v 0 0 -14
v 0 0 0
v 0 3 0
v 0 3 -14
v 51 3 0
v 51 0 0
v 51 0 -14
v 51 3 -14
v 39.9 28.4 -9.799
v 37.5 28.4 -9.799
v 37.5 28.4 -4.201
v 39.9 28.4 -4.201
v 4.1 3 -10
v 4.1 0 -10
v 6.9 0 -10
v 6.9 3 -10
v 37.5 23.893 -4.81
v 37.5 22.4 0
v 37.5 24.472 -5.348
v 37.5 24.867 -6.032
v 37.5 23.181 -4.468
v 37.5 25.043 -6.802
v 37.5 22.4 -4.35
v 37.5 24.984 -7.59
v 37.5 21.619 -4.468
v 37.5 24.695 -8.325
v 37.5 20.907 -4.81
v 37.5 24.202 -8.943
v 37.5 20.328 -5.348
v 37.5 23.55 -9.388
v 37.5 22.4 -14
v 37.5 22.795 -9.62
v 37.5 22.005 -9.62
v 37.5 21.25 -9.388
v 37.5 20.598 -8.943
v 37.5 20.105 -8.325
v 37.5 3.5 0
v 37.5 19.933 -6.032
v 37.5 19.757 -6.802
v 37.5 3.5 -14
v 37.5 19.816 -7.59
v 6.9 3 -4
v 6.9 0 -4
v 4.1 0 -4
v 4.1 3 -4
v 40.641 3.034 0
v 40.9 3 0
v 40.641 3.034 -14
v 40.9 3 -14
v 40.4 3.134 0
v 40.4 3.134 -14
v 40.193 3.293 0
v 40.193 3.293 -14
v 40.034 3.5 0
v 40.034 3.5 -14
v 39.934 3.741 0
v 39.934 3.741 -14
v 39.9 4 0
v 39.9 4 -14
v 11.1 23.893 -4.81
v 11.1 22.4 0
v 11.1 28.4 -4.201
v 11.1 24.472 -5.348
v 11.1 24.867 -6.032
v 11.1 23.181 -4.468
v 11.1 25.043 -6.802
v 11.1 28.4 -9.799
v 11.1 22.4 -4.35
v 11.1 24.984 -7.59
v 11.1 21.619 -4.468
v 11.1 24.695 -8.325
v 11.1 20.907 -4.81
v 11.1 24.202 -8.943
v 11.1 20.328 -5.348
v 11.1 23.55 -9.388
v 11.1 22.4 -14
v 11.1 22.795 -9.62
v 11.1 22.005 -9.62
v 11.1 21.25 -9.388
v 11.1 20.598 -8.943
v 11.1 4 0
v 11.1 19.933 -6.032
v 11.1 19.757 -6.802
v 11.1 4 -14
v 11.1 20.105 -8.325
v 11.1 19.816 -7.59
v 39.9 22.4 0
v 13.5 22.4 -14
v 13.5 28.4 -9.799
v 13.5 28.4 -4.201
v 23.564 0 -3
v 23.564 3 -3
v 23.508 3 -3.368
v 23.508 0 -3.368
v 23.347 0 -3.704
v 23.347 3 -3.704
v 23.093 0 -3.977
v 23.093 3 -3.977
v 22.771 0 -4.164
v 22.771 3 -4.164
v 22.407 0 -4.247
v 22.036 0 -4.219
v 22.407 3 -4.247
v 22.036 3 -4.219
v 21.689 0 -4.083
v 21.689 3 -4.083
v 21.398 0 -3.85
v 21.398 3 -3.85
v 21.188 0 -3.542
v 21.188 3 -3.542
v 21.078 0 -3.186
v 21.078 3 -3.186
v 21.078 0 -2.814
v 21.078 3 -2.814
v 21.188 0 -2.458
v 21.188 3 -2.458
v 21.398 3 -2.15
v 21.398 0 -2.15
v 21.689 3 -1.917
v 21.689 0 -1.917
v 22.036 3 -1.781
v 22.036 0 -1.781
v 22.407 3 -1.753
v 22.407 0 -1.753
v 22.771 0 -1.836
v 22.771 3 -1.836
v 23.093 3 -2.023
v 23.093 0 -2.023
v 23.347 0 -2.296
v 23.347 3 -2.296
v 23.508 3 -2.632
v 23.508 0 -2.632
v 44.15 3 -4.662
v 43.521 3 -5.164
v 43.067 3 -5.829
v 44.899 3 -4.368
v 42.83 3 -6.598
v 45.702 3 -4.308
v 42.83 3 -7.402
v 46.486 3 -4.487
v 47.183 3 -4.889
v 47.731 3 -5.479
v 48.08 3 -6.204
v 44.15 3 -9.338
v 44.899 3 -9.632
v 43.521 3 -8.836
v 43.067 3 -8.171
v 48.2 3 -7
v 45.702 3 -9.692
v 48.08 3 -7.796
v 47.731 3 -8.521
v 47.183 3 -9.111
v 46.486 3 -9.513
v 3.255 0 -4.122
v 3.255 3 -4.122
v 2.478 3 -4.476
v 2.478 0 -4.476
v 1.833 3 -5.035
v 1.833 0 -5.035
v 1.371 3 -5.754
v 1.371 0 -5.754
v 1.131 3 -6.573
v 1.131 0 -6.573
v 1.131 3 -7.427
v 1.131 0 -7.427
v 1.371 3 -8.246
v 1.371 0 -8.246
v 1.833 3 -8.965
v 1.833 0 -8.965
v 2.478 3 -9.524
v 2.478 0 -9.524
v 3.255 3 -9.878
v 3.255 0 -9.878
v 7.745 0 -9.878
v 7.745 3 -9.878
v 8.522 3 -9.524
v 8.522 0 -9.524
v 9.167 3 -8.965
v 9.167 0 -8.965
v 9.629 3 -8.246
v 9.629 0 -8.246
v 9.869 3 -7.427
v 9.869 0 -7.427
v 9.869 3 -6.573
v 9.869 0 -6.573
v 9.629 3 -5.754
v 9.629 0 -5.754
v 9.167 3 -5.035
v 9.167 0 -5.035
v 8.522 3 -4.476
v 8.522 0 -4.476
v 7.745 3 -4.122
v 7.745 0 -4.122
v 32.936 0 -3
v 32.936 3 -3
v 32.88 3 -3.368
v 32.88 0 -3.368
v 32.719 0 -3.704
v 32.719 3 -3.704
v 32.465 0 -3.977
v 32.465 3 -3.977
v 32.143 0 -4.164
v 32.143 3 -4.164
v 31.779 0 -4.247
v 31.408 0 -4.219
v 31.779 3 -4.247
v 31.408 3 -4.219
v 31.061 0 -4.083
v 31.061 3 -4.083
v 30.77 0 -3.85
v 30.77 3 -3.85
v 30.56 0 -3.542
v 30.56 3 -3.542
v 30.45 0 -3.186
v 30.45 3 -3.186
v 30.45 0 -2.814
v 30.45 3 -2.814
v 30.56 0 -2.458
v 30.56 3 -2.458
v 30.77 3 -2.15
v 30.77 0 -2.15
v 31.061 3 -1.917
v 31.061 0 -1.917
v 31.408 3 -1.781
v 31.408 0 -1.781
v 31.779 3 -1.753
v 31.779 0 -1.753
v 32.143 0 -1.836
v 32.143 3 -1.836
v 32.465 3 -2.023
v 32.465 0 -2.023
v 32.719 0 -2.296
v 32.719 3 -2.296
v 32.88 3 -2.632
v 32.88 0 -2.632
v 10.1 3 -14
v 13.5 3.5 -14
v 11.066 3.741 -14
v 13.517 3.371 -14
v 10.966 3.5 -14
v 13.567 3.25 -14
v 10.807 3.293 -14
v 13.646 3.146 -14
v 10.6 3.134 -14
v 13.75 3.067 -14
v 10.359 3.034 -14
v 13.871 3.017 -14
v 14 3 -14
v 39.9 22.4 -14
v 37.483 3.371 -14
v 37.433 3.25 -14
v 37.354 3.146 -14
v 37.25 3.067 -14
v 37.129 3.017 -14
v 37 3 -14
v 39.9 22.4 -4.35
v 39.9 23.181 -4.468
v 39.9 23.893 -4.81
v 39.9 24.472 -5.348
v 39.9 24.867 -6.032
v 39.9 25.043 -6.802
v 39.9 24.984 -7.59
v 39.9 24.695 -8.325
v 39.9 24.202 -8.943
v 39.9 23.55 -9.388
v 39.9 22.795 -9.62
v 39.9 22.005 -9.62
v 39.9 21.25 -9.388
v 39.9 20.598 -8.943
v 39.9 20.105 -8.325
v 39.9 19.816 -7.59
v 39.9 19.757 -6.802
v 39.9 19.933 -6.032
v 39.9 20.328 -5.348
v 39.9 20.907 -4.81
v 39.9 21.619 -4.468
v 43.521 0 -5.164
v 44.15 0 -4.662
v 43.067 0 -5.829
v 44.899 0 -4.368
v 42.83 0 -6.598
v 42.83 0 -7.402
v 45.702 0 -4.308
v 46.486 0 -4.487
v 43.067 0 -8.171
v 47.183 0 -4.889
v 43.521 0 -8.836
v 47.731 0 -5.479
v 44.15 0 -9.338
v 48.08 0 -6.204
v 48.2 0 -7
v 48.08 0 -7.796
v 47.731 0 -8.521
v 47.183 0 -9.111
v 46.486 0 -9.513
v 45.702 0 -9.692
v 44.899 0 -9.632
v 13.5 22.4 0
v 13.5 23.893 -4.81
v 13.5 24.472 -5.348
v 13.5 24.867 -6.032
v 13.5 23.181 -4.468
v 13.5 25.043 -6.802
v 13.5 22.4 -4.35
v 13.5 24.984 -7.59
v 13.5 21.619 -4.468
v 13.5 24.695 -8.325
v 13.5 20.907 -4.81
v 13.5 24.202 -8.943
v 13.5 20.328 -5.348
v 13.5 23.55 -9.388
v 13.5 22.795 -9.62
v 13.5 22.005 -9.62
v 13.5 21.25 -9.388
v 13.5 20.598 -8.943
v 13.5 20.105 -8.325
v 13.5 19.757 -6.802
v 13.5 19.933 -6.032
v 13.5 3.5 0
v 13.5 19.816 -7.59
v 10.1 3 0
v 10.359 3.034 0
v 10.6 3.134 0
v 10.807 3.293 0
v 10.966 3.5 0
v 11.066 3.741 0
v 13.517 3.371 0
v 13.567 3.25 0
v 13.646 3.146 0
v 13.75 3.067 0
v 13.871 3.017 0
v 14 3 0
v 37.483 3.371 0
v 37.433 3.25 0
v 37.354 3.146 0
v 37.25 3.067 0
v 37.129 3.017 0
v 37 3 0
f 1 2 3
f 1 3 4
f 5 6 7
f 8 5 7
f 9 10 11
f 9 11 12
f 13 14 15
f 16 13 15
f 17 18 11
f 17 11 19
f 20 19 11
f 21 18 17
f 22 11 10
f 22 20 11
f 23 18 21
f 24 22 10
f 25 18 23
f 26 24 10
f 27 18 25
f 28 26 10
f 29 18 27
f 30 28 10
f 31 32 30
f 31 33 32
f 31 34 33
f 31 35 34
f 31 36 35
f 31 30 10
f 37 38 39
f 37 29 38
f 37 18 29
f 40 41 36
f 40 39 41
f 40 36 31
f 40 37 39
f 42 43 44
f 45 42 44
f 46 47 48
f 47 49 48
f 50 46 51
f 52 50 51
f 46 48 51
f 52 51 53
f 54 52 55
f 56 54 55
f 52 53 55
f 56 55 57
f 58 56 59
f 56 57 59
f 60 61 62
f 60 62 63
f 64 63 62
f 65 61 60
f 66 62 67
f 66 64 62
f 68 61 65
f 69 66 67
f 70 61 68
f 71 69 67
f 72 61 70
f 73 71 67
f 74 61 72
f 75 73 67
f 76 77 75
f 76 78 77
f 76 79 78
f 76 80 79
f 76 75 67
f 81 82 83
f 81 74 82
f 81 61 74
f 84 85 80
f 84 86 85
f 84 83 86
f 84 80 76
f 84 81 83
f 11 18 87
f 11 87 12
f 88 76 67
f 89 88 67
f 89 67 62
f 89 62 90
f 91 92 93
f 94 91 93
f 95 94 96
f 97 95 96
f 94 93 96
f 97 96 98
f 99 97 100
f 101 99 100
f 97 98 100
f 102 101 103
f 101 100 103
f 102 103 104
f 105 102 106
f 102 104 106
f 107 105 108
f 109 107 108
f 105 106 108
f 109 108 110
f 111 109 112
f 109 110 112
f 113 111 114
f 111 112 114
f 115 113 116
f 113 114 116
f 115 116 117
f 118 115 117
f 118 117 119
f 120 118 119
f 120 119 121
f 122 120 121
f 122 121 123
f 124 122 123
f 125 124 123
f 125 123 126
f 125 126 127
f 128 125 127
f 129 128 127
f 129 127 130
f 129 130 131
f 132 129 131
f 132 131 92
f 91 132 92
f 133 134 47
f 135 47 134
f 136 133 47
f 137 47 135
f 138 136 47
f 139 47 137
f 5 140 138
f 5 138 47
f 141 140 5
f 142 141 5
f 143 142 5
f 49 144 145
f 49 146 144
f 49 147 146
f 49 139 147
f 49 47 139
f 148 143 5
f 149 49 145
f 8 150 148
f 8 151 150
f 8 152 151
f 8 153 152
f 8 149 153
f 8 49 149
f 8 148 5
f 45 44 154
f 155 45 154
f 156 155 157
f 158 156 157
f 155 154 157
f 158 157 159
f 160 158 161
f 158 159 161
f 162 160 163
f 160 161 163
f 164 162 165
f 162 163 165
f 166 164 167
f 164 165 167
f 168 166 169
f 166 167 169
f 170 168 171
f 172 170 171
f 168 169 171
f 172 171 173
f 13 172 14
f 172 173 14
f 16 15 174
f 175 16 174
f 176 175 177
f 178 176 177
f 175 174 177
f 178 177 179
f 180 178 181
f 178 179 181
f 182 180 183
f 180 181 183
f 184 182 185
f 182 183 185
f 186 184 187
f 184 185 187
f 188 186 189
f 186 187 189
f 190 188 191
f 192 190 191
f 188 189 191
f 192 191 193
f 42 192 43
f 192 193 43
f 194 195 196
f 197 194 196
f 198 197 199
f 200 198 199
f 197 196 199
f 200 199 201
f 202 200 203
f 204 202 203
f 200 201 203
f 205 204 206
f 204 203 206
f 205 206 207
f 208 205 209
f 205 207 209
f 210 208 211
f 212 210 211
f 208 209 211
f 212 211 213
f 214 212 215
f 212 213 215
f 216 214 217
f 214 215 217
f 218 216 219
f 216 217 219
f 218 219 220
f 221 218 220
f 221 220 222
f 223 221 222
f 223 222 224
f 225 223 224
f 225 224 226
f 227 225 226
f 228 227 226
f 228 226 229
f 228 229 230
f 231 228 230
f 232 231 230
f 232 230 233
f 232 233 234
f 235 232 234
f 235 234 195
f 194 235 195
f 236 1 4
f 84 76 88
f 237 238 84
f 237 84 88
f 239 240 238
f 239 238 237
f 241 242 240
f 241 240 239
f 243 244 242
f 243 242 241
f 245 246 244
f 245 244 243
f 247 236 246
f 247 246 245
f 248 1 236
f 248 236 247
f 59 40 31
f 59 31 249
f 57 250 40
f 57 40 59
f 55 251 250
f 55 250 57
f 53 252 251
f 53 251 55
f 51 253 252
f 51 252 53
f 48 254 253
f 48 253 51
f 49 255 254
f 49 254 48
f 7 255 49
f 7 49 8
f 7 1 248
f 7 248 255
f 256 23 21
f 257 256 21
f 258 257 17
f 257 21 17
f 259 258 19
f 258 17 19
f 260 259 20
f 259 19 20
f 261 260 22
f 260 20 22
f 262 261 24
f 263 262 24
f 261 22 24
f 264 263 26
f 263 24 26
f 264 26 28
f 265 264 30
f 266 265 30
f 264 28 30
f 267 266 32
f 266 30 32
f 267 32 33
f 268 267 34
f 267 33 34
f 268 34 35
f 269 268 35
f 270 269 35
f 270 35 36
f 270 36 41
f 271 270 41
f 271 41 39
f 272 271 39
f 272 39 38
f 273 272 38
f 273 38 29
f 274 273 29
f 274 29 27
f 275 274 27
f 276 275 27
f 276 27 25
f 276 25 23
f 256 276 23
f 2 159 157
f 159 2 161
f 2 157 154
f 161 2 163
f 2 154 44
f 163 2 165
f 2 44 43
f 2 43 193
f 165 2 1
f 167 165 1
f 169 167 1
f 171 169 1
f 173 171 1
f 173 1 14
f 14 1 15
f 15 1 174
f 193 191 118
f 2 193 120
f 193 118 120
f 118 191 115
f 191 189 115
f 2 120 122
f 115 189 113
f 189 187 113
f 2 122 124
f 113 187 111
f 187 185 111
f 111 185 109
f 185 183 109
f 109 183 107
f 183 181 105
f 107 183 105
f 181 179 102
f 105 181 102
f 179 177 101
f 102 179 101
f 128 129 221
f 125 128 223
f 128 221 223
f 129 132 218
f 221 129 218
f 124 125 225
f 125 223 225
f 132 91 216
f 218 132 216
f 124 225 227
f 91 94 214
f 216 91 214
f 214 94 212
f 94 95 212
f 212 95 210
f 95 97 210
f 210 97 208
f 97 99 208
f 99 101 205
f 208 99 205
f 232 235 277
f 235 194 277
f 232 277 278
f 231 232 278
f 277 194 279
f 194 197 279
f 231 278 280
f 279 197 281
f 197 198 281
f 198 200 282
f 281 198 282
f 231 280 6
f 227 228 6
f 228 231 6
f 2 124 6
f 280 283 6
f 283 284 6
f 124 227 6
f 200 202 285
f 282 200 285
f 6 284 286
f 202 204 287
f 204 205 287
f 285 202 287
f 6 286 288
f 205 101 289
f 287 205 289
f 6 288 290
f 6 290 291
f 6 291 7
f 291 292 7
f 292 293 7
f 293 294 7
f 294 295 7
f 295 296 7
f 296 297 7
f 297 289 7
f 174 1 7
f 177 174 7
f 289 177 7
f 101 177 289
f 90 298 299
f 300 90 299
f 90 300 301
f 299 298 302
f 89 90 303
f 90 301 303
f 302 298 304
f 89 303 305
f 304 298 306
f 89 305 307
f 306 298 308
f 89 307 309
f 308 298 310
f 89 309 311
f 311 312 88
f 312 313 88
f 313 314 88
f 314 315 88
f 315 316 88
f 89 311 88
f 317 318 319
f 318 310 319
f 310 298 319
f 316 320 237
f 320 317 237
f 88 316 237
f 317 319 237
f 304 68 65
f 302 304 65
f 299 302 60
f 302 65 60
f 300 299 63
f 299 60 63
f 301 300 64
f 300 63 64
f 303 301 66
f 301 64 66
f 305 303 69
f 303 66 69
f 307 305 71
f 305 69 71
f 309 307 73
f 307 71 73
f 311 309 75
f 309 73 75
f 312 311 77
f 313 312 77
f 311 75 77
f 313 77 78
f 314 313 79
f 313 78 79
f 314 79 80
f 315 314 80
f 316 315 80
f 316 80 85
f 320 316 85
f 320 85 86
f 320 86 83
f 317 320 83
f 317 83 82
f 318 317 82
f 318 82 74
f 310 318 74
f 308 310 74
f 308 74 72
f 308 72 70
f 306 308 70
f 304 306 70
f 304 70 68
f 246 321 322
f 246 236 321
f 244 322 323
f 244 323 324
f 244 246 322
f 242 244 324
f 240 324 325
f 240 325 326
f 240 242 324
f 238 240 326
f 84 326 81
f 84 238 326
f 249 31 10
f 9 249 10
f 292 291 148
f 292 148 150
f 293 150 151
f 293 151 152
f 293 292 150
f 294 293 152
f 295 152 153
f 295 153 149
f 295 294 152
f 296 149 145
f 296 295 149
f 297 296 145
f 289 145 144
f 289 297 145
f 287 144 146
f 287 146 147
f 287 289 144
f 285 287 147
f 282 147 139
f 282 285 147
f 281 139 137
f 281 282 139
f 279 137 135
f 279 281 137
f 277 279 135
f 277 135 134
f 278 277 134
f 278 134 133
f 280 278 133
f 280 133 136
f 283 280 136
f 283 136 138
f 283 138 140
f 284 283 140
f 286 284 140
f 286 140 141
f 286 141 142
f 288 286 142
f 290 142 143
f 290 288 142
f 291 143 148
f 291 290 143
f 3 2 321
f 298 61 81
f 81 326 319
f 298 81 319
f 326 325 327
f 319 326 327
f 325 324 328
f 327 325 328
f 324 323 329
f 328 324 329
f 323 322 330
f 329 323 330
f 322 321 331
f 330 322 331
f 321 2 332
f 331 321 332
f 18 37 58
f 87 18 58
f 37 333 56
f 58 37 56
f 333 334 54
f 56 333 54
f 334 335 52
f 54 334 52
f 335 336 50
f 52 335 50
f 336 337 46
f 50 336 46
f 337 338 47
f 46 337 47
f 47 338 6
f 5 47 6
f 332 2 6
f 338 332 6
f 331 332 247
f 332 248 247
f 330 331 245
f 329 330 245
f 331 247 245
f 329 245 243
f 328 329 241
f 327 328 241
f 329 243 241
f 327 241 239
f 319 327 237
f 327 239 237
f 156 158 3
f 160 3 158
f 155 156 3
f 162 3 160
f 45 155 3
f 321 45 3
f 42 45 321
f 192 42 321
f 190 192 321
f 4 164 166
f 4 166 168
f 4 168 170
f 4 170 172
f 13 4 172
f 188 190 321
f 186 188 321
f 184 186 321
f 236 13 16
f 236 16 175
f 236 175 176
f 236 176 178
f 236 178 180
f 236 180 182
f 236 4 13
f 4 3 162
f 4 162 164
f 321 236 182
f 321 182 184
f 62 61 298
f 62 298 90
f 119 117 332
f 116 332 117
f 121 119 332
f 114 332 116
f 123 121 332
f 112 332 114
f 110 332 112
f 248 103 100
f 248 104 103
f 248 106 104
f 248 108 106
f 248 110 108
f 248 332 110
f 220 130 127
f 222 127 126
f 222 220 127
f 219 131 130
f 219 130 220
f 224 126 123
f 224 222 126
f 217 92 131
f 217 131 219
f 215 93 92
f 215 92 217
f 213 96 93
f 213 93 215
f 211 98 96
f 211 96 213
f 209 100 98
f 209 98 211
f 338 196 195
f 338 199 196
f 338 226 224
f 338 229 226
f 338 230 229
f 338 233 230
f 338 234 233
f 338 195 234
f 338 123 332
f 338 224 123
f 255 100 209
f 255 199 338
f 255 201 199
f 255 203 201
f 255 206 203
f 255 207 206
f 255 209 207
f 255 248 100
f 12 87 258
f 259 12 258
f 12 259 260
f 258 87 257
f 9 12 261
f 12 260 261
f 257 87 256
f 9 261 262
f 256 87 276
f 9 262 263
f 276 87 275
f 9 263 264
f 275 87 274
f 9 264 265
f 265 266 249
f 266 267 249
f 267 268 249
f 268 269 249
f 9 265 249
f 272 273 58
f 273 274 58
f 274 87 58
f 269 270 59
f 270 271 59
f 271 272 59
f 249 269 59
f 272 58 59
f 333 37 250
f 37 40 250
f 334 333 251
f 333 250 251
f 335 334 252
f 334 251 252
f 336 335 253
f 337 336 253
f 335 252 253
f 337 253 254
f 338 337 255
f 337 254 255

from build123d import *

# Parameters (mm, degrees)
SKETCH1_W           = 51
SKETCH1_H           = 14
SKETCH1_R           = 2.7
BOSS_EXTRUDE1_DEPTH = 3
SKETCH2_W           = 2.4
SKETCH2_H           = 14
BOSS_EXTRUDE2_DEPTH = 25.4
CUT_EXTRUDE1_REACH  = 5
SKETCH3_R           = 1.25
SKETCH4_R           = 2.65
CUT_EXTRUDE2_DEPTH  = 40.9
CUT_EXTRUDE3_DEPTH  = 40.9
FILLET1_R           = 1
FILLET2_R           = 0.5


with BuildPart() as part:
    # Sketch1 → Boss-Extrude1 (new body)
    with BuildSketch(Plane(origin=(0, 0, 0), x_dir=(1, 0, 0), z_dir=(0, 1, 0))):
        with Locations((25.5, 7)):
            Rectangle(SKETCH1_W, SKETCH1_H)
        with Locations((45.5, 7)):
            Circle(SKETCH1_R, mode=Mode.SUBTRACT)
        with BuildLine():
            Line((4.1, 10), (6.9, 10))
            ThreePointArc((6.9, 10), (9.9, 7), (6.9, 4))
            Line((6.9, 4), (4.1, 4))
            ThreePointArc((4.1, 4), (1.1, 7), (4.1, 10))
        make_face(mode=Mode.SUBTRACT)
    extrude(amount=BOSS_EXTRUDE1_DEPTH)

    # Sketch2 → Boss-Extrude2 (add)
    with BuildSketch(Plane(origin=(0, 3, 0), x_dir=(1, 0, 0), z_dir=(0, 1, 0))):
        with Locations((12.3, 7)):
            Rectangle(SKETCH2_W, SKETCH2_H)
        with Locations((38.7, 7)):
            Rectangle(SKETCH2_W, SKETCH2_H)
    extrude(amount=BOSS_EXTRUDE2_DEPTH)

    # Sketch3 → Cut-Extrude1 (cut, up to next)
    with BuildSketch(Plane(origin=(0, 3, 0), x_dir=(1, 0, 0), z_dir=(0, 1, 0)), mode=Mode.PRIVATE) as cut_extrude1_sk1:
        with Locations((22.314, 3)):
            Circle(SKETCH3_R)
    cut_extrude1_tool1 = extrude(cut_extrude1_sk1.sketch, amount=-CUT_EXTRUDE1_REACH, mode=Mode.PRIVATE) & part.part
    add(cut_extrude1_tool1.solids().sort_by_distance((22.314, 3, -3))[0], mode=Mode.SUBTRACT)
    # Sketch3 → Cut-Extrude1 (cut, up to next)
    with BuildSketch(Plane(origin=(0, 3, 0), x_dir=(1, 0, 0), z_dir=(0, 1, 0)), mode=Mode.PRIVATE) as cut_extrude1_sk2:
        with Locations((31.686, 3)):
            Circle(SKETCH3_R)
    cut_extrude1_tool2 = extrude(cut_extrude1_sk2.sketch, amount=-CUT_EXTRUDE1_REACH, mode=Mode.PRIVATE) & part.part
    add(cut_extrude1_tool2.solids().sort_by_distance((31.686, 3, -3))[0], mode=Mode.SUBTRACT)

    # Sketch4 → Cut-Extrude2 (cut, through all)
    with BuildSketch(Plane.ZY.offset(-11.1)):
        with Locations((-7, 22.4)):
            Circle(SKETCH4_R)
    extrude(amount=-CUT_EXTRUDE2_DEPTH, mode=Mode.SUBTRACT)

    # Sketch5 → Cut-Extrude3 (cut, through all)
    with BuildSketch(Plane.ZY.offset(-11.1)):
        Polygon((-14, 22.4), (-9.798754771, 28.4), (-14, 28.4), align=None)
        Polygon((0, 22.4), (-4.201245229, 28.4), (0, 28.4), align=None)
    extrude(amount=-CUT_EXTRUDE3_DEPTH, mode=Mode.SUBTRACT)

    # Fillet1
    fillet1_edges = [part.edges().sort_by_distance(p)[0] for p in [
        (39.9, 3, -7),
        (11.1, 3, -7),
    ]]
    fillet(fillet1_edges, radius=FILLET1_R)

    # Fillet2
    fillet2_edges = [part.edges().sort_by_distance(p)[0] for p in [
        (37.5, 3, -7),
        (13.5, 3, -7),
    ]]
    fillet(fillet2_edges, radius=FILLET2_R)


solid = part.part
